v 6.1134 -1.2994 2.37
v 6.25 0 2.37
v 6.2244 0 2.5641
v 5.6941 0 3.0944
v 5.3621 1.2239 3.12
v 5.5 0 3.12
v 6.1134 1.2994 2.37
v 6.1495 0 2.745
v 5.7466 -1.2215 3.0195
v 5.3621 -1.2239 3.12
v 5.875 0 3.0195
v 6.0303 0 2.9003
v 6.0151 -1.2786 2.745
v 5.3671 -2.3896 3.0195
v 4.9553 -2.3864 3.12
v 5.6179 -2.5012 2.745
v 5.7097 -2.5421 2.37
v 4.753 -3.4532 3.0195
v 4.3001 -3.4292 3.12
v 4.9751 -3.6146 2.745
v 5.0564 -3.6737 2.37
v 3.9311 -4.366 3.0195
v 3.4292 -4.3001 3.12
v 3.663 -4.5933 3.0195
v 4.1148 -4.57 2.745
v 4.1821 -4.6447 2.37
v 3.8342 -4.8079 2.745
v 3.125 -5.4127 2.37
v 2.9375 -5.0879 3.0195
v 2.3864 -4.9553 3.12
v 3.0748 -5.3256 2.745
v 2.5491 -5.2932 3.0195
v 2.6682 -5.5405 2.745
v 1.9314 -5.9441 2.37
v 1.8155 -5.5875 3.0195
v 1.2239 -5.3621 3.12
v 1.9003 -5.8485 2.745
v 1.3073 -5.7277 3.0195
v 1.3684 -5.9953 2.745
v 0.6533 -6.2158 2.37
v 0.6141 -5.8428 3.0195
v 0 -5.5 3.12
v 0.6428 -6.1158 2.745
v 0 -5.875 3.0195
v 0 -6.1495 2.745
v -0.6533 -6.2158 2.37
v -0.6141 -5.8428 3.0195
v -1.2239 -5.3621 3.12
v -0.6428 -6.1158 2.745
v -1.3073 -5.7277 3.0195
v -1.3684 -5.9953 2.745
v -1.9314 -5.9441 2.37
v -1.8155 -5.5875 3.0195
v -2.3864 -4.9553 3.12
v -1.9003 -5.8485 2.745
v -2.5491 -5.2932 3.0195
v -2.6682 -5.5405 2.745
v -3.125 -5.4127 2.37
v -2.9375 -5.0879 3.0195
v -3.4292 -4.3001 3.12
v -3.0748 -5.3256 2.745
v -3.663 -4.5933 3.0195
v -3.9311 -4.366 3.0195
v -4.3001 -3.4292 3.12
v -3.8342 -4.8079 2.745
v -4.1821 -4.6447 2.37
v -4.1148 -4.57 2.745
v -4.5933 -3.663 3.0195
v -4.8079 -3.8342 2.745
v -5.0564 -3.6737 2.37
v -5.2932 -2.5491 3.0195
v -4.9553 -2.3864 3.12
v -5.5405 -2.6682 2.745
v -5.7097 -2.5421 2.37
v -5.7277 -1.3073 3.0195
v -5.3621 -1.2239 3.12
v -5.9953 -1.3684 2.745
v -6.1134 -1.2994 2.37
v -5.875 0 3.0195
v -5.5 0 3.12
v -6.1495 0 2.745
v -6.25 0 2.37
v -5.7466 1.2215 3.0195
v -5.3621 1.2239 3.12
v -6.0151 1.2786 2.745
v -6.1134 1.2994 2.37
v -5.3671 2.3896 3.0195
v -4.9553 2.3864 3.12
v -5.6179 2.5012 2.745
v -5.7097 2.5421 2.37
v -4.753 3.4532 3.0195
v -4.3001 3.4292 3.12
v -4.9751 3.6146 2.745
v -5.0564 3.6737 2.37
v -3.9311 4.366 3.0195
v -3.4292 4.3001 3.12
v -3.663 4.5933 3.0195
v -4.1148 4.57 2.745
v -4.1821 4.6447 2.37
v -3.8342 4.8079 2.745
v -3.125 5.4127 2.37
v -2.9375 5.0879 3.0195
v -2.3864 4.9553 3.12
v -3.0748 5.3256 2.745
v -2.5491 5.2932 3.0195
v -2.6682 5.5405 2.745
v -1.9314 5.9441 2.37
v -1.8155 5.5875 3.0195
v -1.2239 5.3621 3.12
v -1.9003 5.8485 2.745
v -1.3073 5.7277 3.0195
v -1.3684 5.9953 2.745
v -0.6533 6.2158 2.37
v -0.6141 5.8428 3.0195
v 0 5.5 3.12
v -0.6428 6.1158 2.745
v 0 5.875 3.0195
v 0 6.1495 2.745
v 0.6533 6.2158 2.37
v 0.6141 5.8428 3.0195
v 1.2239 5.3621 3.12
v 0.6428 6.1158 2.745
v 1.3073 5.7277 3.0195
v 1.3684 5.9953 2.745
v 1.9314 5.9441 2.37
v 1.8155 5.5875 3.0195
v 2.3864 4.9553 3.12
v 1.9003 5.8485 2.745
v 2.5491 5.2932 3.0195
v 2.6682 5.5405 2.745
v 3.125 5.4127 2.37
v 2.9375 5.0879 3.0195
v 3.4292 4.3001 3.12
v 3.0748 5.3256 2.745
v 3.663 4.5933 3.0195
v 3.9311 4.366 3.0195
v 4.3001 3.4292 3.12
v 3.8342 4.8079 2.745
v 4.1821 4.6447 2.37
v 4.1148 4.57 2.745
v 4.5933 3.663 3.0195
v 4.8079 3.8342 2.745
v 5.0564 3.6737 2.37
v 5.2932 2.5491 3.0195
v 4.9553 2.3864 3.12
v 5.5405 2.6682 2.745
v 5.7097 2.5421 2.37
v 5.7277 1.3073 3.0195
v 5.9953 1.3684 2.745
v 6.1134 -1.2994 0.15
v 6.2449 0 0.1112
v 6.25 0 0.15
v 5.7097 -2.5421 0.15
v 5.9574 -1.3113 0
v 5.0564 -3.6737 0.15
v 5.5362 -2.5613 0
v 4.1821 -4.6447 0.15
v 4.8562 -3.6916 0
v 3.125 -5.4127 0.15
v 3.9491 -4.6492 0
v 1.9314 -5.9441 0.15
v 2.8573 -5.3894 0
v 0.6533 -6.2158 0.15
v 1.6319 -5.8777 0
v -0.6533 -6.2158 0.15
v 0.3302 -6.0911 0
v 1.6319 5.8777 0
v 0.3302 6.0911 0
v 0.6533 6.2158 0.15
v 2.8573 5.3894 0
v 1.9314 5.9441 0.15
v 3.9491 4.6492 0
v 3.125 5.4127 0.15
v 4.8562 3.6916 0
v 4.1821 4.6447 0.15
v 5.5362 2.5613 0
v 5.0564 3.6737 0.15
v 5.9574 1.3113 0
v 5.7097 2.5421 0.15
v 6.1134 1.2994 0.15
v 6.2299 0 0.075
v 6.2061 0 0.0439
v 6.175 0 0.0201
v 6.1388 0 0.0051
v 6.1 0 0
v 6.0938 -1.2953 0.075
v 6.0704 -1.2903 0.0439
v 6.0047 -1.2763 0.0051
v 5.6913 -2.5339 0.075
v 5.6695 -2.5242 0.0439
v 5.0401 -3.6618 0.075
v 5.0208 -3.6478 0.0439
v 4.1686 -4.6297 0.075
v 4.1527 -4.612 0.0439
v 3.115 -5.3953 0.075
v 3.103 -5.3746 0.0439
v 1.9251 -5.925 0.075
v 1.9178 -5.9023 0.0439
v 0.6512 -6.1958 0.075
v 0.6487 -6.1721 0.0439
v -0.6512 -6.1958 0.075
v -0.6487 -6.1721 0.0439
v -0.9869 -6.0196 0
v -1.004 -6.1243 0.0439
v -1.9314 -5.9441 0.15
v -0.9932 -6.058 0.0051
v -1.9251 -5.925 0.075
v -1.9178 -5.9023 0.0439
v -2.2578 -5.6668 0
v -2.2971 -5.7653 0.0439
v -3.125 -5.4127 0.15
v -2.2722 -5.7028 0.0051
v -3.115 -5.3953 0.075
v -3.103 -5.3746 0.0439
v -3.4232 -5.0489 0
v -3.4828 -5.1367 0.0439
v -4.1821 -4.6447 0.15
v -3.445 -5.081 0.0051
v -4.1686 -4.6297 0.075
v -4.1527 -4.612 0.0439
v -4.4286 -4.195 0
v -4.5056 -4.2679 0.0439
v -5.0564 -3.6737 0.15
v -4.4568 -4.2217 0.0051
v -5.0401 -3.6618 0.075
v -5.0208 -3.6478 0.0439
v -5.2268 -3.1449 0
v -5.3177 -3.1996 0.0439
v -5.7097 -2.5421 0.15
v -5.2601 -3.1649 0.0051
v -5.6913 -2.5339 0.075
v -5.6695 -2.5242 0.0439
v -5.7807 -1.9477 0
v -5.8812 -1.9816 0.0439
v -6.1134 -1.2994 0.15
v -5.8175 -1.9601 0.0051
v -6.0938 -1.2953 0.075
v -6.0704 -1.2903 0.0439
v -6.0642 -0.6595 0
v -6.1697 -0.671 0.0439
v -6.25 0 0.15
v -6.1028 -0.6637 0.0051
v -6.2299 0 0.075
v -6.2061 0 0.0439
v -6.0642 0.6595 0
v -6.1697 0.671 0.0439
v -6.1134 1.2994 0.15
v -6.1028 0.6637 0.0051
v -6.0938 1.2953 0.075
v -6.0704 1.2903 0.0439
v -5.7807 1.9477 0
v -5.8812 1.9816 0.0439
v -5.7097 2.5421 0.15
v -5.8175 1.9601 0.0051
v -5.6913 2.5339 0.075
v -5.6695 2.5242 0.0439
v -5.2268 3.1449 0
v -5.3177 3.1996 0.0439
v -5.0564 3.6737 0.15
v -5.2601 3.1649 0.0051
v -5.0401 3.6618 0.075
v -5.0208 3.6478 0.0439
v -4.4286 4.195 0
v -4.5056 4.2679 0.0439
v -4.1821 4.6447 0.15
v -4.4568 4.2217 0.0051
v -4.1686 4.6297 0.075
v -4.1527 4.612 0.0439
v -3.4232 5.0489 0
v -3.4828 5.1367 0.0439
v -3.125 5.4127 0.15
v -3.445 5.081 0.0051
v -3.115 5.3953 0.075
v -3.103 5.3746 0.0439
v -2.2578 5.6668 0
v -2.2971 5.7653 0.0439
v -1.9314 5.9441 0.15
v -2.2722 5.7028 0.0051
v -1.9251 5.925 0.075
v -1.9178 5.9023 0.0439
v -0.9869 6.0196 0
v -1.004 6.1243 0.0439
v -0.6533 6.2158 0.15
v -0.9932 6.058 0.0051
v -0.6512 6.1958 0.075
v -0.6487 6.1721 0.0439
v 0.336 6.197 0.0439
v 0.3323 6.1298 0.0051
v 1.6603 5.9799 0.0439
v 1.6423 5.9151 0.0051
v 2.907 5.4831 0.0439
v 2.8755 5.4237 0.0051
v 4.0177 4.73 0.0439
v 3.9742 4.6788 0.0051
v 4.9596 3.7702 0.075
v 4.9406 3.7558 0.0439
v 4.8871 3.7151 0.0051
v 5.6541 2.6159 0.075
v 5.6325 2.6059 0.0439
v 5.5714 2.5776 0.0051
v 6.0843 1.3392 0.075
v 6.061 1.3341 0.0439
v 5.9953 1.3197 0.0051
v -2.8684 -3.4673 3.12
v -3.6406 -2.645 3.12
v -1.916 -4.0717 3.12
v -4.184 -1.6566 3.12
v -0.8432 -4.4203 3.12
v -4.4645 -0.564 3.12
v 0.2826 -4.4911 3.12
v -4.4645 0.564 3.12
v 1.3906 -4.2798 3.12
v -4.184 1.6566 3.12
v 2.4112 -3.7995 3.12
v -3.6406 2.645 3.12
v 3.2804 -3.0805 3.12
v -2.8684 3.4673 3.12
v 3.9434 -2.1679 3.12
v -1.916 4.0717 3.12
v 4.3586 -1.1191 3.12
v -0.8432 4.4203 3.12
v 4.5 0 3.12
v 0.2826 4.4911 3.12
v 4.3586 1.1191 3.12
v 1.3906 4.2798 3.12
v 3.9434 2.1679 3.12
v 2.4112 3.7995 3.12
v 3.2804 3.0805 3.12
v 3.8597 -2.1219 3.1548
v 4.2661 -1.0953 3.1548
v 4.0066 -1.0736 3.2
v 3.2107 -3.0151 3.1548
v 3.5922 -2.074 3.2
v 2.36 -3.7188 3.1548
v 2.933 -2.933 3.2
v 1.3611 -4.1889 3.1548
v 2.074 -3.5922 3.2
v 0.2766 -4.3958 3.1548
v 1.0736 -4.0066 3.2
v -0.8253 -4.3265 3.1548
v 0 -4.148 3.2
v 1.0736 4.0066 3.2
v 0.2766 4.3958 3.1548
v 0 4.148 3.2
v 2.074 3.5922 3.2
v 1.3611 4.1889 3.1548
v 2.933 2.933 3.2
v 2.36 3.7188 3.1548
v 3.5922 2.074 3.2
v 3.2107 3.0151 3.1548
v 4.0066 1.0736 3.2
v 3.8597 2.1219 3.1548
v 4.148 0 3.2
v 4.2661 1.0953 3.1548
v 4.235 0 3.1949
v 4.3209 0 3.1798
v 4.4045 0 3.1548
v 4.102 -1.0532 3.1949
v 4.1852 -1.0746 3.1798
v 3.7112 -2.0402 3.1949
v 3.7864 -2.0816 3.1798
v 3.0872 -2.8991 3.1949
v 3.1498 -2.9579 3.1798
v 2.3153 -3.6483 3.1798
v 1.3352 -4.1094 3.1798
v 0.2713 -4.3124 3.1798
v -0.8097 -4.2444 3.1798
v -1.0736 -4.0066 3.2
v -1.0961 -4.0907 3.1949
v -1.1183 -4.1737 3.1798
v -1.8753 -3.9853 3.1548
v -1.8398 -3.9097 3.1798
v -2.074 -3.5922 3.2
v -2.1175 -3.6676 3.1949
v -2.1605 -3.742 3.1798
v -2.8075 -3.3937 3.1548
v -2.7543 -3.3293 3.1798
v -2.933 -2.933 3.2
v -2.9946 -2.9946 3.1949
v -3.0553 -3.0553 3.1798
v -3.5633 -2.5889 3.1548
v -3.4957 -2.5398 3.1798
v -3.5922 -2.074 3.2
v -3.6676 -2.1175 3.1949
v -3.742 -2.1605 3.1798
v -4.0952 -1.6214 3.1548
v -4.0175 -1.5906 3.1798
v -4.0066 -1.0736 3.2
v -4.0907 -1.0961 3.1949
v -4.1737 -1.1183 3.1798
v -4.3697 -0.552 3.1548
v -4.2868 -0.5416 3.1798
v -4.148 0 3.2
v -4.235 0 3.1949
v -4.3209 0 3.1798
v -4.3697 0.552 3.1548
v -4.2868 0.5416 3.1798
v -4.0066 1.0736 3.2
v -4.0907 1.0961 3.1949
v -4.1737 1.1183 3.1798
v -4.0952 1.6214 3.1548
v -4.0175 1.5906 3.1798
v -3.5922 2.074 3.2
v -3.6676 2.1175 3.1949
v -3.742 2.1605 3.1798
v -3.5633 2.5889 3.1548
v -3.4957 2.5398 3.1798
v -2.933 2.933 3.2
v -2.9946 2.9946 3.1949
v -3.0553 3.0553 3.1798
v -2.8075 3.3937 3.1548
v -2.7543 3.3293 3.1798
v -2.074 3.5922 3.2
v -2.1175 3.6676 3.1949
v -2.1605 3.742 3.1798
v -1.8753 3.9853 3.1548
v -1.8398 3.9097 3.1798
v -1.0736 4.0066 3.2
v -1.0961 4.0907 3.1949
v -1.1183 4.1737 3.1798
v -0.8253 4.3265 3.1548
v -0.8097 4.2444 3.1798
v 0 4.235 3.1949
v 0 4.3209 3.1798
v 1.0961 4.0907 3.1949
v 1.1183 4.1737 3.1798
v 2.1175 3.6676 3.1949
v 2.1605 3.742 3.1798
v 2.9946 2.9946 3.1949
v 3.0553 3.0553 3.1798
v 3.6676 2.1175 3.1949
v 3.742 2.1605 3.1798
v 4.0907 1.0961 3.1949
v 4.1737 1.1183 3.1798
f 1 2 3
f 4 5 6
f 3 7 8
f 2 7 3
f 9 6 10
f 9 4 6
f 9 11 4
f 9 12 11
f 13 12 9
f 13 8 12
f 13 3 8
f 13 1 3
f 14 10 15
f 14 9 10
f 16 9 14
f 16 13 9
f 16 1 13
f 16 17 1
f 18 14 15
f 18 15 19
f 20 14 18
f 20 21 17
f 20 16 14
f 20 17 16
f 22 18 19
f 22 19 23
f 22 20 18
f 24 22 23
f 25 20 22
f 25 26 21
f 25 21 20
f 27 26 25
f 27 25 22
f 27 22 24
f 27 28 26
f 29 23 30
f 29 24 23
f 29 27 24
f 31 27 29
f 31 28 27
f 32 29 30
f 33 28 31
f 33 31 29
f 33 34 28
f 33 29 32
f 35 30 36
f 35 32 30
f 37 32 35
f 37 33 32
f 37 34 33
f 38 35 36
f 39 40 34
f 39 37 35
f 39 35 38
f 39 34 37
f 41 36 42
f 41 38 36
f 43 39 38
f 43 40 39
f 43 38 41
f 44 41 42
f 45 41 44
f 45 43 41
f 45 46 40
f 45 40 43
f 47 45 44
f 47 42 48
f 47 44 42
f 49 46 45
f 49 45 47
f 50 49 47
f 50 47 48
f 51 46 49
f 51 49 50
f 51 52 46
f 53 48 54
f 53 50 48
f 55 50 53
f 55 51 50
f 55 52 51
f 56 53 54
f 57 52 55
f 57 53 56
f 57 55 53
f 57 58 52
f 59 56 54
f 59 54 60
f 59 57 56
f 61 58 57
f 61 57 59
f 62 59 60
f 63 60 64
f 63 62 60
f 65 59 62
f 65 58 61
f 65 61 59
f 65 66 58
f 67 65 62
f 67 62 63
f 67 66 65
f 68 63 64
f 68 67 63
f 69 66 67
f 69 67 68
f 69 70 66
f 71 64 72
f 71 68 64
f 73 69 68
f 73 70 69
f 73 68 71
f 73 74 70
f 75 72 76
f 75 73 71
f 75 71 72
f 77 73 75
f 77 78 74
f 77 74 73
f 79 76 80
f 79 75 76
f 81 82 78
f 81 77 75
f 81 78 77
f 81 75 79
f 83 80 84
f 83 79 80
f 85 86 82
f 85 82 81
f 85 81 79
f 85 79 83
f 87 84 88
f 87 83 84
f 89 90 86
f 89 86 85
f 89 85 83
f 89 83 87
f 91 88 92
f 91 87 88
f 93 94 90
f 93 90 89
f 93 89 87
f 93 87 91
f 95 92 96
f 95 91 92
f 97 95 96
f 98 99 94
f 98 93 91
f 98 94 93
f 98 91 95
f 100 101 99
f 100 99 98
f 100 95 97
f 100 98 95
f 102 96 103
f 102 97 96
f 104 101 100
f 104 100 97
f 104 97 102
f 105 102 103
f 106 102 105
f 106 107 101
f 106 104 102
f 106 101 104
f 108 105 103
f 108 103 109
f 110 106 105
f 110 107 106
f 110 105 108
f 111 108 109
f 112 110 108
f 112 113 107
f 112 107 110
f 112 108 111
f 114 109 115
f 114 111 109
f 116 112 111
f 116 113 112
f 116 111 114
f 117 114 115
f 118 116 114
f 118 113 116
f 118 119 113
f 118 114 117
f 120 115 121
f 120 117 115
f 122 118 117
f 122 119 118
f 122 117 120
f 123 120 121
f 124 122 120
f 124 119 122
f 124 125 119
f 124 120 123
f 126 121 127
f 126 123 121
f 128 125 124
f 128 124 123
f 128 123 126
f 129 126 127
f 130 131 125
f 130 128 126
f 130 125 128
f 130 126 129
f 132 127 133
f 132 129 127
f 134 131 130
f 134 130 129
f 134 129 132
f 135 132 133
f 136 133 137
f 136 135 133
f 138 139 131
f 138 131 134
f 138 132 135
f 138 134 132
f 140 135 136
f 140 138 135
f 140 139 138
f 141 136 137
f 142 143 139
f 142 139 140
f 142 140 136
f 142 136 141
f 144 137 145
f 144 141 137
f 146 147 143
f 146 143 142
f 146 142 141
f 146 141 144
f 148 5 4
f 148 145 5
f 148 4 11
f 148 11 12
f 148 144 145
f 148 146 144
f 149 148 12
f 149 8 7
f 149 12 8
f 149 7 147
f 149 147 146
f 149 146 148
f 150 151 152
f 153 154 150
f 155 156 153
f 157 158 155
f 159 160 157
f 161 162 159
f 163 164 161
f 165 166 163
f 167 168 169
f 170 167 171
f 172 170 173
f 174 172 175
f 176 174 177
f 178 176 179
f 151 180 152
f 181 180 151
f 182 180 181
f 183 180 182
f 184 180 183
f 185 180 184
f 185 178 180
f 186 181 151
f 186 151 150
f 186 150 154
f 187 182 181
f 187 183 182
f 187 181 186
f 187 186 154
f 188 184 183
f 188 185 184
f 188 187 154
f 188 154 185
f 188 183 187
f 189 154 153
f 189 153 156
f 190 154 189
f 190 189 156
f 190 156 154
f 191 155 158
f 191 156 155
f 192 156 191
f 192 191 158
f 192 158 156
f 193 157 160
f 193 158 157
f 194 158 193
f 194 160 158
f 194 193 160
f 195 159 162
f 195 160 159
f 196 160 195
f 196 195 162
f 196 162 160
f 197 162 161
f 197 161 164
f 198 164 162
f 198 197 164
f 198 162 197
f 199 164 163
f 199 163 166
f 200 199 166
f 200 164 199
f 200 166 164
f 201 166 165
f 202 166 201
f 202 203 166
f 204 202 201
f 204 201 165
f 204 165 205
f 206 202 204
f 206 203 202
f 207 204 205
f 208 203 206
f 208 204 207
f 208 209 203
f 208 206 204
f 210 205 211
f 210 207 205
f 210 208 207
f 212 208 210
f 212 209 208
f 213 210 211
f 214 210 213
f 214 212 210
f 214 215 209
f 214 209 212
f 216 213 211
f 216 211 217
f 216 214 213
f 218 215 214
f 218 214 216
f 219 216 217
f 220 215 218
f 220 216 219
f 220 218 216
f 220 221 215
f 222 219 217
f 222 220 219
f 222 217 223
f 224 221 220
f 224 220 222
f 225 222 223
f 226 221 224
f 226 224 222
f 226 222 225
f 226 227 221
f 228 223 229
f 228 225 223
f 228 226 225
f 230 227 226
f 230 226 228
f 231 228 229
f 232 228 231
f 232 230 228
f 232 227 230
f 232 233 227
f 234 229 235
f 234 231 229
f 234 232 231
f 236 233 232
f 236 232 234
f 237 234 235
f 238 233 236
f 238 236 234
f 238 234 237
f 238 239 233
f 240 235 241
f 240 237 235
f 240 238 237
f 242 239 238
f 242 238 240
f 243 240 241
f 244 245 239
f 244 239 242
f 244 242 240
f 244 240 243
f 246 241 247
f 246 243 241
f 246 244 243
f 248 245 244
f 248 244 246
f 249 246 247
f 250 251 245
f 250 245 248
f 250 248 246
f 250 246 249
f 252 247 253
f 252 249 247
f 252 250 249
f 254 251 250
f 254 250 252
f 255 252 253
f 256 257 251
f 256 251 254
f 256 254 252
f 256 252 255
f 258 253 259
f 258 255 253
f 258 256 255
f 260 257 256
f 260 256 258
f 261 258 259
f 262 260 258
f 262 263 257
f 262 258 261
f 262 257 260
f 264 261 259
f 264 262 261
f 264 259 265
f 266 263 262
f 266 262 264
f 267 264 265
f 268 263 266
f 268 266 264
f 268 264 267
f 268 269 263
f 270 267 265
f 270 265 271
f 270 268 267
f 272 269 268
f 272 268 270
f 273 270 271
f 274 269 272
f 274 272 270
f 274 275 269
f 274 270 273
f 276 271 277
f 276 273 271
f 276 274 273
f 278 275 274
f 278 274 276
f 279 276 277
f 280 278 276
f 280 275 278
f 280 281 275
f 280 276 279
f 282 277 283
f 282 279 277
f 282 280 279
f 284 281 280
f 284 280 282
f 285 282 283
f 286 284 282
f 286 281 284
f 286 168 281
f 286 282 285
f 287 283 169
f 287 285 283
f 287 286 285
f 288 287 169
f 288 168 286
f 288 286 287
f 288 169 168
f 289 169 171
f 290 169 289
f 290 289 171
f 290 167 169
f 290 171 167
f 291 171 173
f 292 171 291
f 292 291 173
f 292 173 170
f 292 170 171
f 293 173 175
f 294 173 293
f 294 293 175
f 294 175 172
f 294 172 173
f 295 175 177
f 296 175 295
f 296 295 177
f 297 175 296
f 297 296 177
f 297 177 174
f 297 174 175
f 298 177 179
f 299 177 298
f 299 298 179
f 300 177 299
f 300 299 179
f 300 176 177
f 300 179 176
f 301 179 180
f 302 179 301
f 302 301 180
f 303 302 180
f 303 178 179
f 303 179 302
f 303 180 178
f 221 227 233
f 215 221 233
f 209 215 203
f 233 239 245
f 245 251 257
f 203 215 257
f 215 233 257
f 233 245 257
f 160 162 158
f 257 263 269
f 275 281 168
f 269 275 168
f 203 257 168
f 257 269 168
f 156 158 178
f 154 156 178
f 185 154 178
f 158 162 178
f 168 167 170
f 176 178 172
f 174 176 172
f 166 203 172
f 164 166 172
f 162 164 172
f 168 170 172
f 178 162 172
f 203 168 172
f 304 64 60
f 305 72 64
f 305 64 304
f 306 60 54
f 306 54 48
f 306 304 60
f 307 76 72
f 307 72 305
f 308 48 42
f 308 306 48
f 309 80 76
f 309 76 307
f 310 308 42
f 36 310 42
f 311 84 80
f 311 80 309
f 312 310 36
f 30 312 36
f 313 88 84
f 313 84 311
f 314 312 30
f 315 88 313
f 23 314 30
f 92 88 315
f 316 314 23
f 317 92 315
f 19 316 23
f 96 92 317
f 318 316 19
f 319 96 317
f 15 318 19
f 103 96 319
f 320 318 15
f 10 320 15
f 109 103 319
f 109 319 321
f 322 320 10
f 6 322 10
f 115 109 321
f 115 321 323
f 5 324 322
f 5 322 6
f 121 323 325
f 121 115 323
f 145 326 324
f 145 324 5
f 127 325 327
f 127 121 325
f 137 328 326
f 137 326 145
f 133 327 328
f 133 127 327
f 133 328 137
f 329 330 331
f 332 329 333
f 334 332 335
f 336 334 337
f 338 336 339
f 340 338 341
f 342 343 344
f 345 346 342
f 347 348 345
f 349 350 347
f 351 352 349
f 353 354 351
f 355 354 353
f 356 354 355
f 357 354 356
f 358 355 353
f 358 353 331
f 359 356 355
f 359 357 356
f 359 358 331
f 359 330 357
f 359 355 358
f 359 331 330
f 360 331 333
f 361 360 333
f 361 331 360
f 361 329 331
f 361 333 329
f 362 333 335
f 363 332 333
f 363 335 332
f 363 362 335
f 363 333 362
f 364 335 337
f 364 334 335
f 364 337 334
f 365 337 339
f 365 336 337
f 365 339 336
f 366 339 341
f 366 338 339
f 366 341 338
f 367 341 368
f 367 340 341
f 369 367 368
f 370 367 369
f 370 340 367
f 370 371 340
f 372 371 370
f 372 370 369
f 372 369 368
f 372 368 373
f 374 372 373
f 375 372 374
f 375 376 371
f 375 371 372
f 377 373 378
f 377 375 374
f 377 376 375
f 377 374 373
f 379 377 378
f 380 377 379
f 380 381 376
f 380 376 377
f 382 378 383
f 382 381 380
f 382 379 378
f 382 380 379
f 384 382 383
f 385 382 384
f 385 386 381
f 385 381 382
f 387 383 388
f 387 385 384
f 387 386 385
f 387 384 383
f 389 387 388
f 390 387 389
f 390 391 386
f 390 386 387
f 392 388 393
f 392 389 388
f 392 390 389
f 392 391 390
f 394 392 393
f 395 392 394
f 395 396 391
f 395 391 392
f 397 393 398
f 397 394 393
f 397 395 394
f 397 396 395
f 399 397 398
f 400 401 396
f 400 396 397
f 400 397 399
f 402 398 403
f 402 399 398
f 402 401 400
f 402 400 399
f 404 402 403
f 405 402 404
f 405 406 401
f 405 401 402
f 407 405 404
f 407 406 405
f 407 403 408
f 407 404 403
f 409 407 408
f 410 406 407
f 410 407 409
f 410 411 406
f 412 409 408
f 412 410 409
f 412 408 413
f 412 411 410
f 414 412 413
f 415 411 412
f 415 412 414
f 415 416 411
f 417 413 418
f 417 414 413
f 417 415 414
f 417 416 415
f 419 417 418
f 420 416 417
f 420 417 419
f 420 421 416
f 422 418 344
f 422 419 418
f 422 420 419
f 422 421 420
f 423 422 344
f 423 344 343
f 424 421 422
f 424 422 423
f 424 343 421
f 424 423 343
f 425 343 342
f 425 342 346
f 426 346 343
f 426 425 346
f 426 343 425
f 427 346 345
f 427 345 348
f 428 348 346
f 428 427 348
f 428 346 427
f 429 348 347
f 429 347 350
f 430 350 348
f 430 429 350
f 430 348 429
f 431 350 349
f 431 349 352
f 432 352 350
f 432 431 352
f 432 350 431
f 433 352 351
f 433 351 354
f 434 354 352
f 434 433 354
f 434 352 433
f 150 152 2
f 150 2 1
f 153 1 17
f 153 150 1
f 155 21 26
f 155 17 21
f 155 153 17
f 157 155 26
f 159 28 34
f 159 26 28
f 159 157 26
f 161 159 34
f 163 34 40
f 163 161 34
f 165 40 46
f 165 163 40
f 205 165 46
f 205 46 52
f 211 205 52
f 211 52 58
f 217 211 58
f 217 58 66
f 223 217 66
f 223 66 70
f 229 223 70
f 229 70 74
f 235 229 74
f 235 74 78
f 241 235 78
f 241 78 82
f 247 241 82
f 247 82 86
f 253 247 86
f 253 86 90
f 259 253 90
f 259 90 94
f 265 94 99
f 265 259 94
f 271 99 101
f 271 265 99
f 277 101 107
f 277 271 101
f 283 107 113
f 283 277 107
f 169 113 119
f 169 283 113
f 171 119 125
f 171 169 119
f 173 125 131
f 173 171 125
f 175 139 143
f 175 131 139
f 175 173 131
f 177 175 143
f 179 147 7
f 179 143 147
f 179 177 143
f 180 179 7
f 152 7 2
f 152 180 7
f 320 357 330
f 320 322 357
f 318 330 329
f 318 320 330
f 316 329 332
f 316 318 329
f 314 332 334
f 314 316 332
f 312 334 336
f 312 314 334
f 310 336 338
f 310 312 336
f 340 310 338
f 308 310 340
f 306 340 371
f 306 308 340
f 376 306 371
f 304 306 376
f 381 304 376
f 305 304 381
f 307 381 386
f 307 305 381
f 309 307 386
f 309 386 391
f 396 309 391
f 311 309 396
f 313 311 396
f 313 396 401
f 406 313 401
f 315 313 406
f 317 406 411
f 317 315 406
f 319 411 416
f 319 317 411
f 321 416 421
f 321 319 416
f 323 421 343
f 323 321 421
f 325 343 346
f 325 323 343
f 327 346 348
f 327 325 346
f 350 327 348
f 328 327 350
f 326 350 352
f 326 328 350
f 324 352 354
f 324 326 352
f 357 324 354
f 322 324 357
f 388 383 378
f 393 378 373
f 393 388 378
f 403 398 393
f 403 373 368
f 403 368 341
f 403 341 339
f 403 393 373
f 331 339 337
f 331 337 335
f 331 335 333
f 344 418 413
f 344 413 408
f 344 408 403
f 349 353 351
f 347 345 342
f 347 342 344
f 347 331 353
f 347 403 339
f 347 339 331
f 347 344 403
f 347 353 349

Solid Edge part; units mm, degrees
sketch "Sketch1" plane through (0, 0, 0) normal (0, -1, 0) x (1, 0, 0)
  line L0 (0, 3.2) -> (4.2802, 3.2)
  line L1 (4.2802, 3.2) -> (4.5, 3.12)
  line L2 (4.5, 3.12) -> (6.25, 3.12)
  line L3 (6.25, 3.12) -> (6.25, 0)
  line L4 (6.25, 0) -> (0, 0)
  dimension "D1" = 6.25
  dimension "D2" = 4.5
  dimension "D3" = 0.08
  dimension "D4" = 3.2
revolve "RevolvedProtrusion1" add sketch "Sketch1" angle 360 about axis through (0, 0, 0) along (0, 0, 1)
fillet "Round1" radius 0.75 2 edges at (-6.25, 0, 3.12) (-4.2802, 0, 3.2)
fillet "Round_2" radius 0.15 1 edges at (-6.25, 0, 0)
